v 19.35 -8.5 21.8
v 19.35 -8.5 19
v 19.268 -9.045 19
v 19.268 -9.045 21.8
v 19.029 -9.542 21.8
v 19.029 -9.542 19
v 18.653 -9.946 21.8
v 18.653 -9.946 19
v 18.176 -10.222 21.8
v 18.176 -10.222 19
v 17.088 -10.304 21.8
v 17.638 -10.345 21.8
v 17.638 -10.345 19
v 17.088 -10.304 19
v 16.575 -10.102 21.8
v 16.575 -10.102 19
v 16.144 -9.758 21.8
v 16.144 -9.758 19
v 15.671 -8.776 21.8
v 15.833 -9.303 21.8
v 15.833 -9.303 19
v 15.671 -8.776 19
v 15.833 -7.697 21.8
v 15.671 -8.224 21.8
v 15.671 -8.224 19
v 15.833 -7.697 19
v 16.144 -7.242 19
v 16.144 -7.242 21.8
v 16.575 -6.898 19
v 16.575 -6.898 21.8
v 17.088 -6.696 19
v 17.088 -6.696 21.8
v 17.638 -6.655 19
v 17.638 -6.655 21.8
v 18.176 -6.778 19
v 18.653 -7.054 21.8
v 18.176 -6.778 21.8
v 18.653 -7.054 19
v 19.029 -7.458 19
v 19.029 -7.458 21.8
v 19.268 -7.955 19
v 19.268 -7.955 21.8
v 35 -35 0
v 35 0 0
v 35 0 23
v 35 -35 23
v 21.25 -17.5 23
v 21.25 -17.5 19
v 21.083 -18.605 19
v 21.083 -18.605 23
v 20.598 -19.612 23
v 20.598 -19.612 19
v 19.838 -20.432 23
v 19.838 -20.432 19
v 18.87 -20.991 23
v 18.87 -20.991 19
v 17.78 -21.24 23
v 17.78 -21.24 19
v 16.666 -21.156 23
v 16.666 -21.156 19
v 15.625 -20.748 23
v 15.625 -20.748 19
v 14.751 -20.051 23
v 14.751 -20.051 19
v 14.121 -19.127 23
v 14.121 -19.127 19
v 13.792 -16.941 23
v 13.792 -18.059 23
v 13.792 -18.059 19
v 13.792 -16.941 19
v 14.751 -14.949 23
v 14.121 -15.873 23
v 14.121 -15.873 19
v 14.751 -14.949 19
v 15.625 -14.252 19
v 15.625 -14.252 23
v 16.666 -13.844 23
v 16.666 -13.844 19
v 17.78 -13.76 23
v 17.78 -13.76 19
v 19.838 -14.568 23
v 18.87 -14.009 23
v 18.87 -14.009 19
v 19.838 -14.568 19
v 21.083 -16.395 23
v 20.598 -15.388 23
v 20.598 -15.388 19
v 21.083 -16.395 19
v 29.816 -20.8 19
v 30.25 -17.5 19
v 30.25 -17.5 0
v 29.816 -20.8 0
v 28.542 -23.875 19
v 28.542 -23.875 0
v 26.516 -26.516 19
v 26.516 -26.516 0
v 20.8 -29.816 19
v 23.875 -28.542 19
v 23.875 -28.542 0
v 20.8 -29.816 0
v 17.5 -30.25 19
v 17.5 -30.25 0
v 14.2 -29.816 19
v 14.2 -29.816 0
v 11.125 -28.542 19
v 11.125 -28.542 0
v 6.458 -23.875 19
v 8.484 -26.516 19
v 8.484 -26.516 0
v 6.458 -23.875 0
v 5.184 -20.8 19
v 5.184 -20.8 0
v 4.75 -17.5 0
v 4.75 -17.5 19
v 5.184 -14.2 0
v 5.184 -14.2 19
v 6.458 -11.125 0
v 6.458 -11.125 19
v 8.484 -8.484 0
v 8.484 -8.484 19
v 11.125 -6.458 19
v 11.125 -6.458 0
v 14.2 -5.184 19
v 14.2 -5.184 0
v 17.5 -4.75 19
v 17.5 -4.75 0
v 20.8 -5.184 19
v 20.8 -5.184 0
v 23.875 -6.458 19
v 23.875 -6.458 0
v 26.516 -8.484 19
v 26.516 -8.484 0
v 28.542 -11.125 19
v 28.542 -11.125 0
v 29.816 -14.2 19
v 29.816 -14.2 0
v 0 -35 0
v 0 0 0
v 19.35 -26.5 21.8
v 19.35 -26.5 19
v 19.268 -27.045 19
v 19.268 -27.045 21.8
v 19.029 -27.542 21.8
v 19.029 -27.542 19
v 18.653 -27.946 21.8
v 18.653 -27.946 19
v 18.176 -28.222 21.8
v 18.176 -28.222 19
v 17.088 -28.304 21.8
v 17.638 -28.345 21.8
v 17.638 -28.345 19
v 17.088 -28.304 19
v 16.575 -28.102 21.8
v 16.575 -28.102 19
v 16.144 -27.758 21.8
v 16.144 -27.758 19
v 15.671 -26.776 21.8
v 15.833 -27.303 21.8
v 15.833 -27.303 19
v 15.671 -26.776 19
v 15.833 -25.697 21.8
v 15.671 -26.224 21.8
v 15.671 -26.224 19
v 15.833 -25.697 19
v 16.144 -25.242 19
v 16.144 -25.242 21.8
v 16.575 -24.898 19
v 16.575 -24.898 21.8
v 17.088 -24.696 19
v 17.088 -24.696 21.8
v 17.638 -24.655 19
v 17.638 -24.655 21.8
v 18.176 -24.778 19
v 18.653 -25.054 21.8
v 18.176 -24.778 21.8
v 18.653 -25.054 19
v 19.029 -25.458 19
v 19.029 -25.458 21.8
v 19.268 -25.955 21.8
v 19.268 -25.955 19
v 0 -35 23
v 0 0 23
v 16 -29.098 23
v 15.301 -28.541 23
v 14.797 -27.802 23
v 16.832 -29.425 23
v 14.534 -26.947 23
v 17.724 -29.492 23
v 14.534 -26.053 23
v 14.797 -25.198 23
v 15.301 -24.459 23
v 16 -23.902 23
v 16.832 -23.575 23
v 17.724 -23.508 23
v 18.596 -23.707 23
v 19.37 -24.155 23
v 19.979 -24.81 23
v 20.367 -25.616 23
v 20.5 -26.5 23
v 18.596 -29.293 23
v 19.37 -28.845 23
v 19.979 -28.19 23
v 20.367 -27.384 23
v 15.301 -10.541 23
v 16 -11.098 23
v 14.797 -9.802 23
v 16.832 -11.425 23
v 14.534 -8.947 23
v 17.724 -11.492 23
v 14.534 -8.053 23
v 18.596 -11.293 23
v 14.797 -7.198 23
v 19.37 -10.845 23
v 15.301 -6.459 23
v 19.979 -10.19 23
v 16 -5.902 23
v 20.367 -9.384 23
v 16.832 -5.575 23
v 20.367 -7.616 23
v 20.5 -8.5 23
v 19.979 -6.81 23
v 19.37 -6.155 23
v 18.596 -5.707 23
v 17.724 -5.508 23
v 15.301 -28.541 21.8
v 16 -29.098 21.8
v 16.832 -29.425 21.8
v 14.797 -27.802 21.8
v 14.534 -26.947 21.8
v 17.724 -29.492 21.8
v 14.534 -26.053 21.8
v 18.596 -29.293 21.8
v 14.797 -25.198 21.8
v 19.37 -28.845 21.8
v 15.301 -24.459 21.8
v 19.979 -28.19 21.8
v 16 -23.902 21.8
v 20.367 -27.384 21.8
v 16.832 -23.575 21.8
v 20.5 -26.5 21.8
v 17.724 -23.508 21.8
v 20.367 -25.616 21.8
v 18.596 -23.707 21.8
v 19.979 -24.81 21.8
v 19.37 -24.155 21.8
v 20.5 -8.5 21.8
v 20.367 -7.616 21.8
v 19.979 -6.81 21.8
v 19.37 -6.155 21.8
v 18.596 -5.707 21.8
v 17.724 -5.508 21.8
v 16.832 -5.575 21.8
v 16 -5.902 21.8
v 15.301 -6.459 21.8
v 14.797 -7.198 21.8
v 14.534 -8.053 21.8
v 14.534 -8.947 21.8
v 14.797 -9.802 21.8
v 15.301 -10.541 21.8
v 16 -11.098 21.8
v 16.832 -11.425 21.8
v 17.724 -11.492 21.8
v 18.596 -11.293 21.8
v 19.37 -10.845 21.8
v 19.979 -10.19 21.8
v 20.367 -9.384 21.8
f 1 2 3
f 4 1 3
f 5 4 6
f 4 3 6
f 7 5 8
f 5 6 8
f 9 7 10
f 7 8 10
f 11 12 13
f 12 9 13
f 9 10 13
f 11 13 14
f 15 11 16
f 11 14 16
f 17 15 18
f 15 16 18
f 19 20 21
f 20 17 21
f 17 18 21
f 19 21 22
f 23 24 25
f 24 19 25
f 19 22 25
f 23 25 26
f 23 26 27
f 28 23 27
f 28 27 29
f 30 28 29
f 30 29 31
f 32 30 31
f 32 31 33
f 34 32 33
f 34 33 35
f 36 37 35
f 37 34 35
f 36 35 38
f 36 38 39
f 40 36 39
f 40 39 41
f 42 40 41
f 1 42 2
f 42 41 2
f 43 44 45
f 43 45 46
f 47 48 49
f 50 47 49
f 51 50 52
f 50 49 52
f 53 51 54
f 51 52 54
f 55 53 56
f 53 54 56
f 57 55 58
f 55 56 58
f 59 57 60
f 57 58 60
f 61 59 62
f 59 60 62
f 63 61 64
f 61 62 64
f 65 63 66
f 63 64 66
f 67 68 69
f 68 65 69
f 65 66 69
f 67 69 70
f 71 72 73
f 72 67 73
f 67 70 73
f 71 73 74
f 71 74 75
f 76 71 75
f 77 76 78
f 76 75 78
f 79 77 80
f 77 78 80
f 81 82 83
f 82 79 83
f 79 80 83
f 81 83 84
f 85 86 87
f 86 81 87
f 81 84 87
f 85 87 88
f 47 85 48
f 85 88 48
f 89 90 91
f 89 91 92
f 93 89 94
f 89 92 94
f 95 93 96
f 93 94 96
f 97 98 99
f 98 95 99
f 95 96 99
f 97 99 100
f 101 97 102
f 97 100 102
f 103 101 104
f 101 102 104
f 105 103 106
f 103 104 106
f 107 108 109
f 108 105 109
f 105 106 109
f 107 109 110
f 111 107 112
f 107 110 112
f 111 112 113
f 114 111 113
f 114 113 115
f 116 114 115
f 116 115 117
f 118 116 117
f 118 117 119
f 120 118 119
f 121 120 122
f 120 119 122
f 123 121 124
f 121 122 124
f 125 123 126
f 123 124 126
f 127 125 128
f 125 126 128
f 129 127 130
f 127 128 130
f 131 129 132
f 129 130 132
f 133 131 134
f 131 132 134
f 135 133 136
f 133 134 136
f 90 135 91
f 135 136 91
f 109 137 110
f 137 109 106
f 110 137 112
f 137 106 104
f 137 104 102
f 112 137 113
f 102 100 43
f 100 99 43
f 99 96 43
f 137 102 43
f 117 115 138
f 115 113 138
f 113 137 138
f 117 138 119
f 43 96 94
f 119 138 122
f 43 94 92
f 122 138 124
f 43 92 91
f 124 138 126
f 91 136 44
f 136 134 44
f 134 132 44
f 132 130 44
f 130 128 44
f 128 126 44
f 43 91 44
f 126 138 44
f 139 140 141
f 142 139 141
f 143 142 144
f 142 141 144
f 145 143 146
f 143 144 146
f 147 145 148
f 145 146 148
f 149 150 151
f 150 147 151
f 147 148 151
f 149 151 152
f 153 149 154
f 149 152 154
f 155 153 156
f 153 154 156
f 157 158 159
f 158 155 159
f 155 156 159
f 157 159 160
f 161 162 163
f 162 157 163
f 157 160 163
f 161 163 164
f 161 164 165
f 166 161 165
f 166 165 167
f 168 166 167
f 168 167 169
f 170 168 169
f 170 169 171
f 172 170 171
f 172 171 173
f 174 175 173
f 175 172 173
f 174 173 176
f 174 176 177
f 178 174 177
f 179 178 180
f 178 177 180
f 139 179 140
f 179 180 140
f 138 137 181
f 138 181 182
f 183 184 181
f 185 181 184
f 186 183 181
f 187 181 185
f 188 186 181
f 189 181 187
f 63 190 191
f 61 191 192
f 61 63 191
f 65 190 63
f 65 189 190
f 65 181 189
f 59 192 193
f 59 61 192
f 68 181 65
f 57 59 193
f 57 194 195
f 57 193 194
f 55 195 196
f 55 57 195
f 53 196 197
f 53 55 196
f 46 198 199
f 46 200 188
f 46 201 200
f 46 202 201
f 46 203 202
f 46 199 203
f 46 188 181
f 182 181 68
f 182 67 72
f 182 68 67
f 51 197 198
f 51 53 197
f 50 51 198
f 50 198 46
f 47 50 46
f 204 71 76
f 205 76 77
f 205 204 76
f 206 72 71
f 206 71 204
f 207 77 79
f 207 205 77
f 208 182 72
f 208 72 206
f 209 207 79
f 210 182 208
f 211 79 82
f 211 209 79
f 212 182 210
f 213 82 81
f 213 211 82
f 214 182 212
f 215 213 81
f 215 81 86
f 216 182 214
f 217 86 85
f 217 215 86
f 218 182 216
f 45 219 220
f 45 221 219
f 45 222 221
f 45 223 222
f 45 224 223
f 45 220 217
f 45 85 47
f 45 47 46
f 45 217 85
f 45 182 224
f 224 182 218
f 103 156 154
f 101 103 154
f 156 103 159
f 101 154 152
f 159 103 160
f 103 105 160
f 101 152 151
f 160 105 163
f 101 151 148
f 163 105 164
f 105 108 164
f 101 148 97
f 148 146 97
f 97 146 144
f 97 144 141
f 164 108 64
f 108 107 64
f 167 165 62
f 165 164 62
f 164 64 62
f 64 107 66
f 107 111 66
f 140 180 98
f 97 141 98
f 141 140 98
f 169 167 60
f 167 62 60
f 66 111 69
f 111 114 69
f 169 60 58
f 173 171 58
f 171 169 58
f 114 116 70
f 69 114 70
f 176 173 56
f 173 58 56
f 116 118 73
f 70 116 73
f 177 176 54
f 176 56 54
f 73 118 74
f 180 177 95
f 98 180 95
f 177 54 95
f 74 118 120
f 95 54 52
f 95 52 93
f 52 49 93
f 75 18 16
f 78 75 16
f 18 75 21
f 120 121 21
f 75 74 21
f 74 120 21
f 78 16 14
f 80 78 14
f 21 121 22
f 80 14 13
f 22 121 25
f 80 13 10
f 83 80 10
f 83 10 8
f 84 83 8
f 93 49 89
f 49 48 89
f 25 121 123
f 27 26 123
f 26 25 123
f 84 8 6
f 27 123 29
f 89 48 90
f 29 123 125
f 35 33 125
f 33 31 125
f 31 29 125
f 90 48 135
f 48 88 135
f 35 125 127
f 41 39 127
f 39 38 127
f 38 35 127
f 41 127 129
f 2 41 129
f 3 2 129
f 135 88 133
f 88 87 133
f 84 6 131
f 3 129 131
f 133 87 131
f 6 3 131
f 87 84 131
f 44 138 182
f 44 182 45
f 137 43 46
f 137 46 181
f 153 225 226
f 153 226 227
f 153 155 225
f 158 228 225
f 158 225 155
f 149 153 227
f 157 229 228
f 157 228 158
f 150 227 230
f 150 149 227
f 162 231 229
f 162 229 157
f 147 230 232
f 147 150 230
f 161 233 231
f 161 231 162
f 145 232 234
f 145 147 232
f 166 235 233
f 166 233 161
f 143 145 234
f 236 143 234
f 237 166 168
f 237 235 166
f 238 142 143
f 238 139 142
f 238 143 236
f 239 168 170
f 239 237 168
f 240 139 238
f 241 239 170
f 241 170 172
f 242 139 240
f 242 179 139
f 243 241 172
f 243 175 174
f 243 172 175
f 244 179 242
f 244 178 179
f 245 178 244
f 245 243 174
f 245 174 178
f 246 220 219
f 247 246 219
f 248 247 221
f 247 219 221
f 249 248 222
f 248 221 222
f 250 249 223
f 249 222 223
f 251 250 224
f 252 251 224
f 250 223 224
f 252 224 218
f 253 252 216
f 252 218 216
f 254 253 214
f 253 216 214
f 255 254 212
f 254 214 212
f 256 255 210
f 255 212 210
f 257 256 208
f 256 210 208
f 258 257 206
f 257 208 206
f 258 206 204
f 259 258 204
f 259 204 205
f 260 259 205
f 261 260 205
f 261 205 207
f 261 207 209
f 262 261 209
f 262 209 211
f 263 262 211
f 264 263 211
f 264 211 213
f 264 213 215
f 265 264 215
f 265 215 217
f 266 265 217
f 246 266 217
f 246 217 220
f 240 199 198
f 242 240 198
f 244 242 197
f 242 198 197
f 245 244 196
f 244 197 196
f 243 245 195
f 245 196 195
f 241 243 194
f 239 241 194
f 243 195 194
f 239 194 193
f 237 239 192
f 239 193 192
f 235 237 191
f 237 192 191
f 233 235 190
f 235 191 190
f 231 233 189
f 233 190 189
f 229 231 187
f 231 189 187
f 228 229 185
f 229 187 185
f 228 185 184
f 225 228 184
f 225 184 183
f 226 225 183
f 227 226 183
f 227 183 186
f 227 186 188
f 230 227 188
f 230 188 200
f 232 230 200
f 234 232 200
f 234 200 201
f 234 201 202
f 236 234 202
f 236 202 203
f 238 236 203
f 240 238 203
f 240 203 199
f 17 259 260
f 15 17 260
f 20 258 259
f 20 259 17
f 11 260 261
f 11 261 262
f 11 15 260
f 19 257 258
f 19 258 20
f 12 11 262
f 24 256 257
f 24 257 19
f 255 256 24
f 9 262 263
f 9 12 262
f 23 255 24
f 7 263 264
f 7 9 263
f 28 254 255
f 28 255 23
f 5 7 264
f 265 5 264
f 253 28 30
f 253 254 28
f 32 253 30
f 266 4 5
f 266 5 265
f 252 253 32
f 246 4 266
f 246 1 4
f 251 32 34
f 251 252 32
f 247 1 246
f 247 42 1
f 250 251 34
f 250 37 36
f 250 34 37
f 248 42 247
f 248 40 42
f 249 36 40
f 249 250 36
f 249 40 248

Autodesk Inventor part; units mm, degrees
ref_plane "YZ Plane" through (0, 0, 0) normal (1, 0, 0) x (0, 1, 0)
ref_plane "XZ Plane" through (0, 0, 0) normal (0, 1, 0) x (-1, 0, 0)
ref_plane "XY Plane" through (0, 0, 0) normal (0, 0, 1) x (1, 0, 0)
sketch "Sketch1" plane through (0, 0, 0) normal (0, 0, 1) x (1, 0, 0)
  line L0 (0, 0) -> (35, 0)
  line L1 (35, 0) -> (35, -35)
  line L2 (35, -35) -> (0, -35)
  line L3 (0, -35) -> (0, 0)
  circle A0 centre (17.5, -17.5) radius 12.75
  dimension "d0" = 35
  dimension "d1" = 35
  dimension "d2" = 25.5
extrude "Extrusion1" add sketch "Sketch1" along normal blind 19
sketch "Sketch2" plane through (0, 0, 19) normal (0, 0, 1) x (1, 0, 0)
  line L0 (35, -35) -> (35, 0) projected
  line L1 (0, 0) -> (35, 0)
  line L2 (35, 0) -> (35, -35)
  line L3 (35, -35) -> (0, -35)
  line L4 (0, -35) -> (0, 0)
  circle A0 centre (17.5, -17.5) radius 3.75
  circle A1 centre (17.5, -8.5) radius 1.85
  circle A2 centre (17.5, -26.5) radius 1.85
  dimension "d5" = 7.5
  dimension "d6" = 17.5
  dimension "d7" = 17.5
  dimension "d8" = 3.7
  dimension "d9" = 3.7
  dimension "d10" = 9
  dimension "d11" = 9
extrude "Extrusion2" add sketch "Sketch2" along normal blind 4
sketch "Sketch3" plane through (0, 0, 23) normal (0, 0, 1) x (1, 0, 0)
  circle A0 centre (17.5, -8.5) radius 1.85 projected
  circle A1 centre (17.5, -8.5) radius 3
  circle A2 centre (17.5, -26.5) radius 1.85 projected
  circle A3 centre (17.5, -26.5) radius 3
  point P0 (0, 0)
  dimension "d14" = 6
  dimension "d15" = 6
extrude "Extrusion3" cut sketch "Sketch3" against normal blind 1.2
properties part number "Motor_Support"
